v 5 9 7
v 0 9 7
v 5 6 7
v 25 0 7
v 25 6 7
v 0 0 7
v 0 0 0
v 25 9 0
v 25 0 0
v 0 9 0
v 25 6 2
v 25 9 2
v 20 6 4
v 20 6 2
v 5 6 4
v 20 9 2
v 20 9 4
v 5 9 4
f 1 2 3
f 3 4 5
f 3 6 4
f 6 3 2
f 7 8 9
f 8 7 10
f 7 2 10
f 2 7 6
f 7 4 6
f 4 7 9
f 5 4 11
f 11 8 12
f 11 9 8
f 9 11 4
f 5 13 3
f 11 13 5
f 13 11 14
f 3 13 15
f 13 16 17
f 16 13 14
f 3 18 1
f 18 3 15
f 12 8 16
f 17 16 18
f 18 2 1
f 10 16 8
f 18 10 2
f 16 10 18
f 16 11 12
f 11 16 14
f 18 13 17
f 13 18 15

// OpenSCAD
translate([2.5, 1.5, 3.5]) color([0.47671524799509457, 0.6946956329164442, 0.31824017683207795]) cube([5, 3, 7], center=true);
translate([7.5, 1.5, 3.5]) color([0.6520544808985483, 0.060222107499701916, 0.3001851524622099]) cube([5, 3, 7], center=true);
translate([12.5, 1.5, 3.5]) color([0.7452096901500458, 0.05240587806206365, 0.6211421952822352]) cube([5, 3, 7], center=true);
translate([17.5, 1.5, 3.5]) color([0.025546799267838538, 0.4715288683099005, 0.8885450437134765]) cube([5, 3, 7], center=true);
translate([22.5, 1.5, 3.5]) color([0.010110093997603875, 0.5268280206539229, 0.06645682965886301]) cube([5, 3, 7], center=true);
translate([2.5, 4.5, 3.5]) color([0.8671097761494883, 0.6862965222396646, 0.7419538566814291]) cube([5, 3, 7], center=true);
translate([7.5, 4.5, 3.5]) color([0.669007579945888, 0.006423453698145676, 0.041177862257898545]) cube([5, 3, 7], center=true);
translate([12.5, 4.5, 3.5]) color([0.6208768040220466, 0.9996851255769114, 0.8731472390917929]) cube([5, 3, 7], center=true);
translate([17.5, 4.5, 3.5]) color([0.699685806725371, 0.7270999543422898, 0.2266870226016624]) cube([5, 3, 7], center=true);
translate([22.5, 4.5, 3.5]) color([0.751613934135812, 0.28792410486343756, 0.10546026702239297]) cube([5, 3, 7], center=true);
translate([2.5, 7.5, 3.5]) color([0.4608948954667579, 0.33019577252961807, 0.168255398651179]) cube([5, 3, 7], center=true);
translate([7.5, 7.5, 1.0]) color([0.42170989251140467, 0.8972009769638755, 0.4352702732981688]) cube([5, 3, 2], center=true);
translate([12.5, 7.5, 1.0]) color([0.4472918952497248, 0.708827757444238, 0.5241618701522923]) cube([5, 3, 2], center=true);
translate([17.5, 7.5, 1.0]) color([0.12922303534199353, 0.91039239754397, 0.4441243361619651]) cube([5, 3, 2], center=true);
translate([22.5, 7.5, 1.0]) color([0.7893377392253591, 0.38887513002224416, 0.806846018820692]) cube([5, 3, 2], center=true);
translate([7.5, 7.5, 3.0]) color([0.3895364160074527, 0.2201595216660458, 0.19619466691666865]) cube([5, 3, 2], center=true);
translate([12.5, 7.5, 3.0]) color([0.9400346443375104, 0.58653025858102, 0.04979326505826487]) cube([5, 3, 2], center=true);
translate([17.5, 7.5, 3.0]) color([0.38834759617804915, 0.234029260524927, 0.08465706460929934]) cube([5, 3, 2], center=true);
